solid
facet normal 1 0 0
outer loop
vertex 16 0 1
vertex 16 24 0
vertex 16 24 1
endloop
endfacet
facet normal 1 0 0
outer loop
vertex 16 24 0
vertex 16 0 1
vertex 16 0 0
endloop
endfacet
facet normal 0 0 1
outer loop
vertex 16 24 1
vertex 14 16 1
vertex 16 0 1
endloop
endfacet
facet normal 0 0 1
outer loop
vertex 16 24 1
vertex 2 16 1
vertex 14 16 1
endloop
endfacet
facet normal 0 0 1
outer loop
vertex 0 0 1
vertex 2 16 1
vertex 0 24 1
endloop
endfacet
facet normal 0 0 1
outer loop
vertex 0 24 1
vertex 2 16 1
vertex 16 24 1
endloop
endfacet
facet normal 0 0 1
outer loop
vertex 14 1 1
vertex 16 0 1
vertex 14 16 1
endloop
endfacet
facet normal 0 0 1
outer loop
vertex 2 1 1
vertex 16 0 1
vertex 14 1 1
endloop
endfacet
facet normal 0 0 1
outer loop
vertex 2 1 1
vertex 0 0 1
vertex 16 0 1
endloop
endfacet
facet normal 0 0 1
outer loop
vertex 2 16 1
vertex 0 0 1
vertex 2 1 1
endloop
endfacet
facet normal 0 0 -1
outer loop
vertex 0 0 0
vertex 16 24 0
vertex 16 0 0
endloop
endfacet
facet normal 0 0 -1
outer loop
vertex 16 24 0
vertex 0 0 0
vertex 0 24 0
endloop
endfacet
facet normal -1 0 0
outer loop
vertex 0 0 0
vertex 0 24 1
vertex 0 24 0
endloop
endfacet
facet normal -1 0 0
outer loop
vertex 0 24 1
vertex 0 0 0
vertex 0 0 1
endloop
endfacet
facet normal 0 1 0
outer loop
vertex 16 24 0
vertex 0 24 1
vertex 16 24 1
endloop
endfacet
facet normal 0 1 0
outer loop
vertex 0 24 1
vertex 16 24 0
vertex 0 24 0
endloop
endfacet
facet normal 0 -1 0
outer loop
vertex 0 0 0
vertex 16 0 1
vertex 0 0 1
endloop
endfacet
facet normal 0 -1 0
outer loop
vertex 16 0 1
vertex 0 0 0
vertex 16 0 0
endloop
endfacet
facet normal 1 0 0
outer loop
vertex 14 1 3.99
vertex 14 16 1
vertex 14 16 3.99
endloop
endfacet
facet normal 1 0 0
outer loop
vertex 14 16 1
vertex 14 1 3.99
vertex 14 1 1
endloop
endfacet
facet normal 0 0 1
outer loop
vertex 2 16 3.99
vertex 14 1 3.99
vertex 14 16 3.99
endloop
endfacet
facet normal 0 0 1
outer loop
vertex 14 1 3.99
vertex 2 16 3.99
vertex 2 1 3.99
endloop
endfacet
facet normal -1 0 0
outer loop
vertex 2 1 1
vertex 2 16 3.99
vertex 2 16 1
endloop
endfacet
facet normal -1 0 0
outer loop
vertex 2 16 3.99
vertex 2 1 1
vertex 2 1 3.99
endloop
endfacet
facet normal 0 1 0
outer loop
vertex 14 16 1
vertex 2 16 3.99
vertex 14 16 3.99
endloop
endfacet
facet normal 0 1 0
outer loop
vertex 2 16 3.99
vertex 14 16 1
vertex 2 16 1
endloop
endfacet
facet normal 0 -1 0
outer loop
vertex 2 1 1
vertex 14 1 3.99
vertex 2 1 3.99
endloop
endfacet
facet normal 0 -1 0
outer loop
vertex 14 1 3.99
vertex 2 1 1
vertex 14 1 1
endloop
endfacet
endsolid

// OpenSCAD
// file: config.scad
// Rendering: Level of detail
$fn = 80;

// Quickfix for rendering artifacts on overlapping surfaces
nothing = 0.01;

/*
 * Globally relevant model parameters
 */
adapter_pcb_size_x = 26;
adapter_pcb_size_y = 29;
adapter_pcb_size_z = 1.0;
adapter_pin_spacing = 2.54;

sensor_pcb_size_x = 20;
sensor_pcb_size_y = 20;
sensor_pcb_size_z = 1.0;

led_socket_pin_spacing = 2.54;
led_socket_pin_count = 4;
led_socket_size_x = led_socket_pin_count * led_socket_pin_spacing;
led_diameter = 5.0;
// main file
include <config.scad>;


/**
 * PCB with Espressif ESP8266 Wifi MCU and onboard antenna
 */
module esp8266mod(
            // PCB outline
            pcb_color = "black",
            pcb_size_x = 16.0,
            pcb_size_y = 24.0,
            pcb_size_z = 1.0,

            // MCU shield outline
            shield_color = "lightgray",
            shield_size_x = 12,
            shield_size_y = 15,
            shield_size_z = 3,
            shield_inset_x = 2,
            shield_inset_y = 1
        )
{
    // Board
    color(pcb_color)
    cube([pcb_size_x, pcb_size_y, pcb_size_z]);

    // MCU shield
    color(shield_color)
    translate([shield_inset_x, shield_inset_y, pcb_size_z-nothing])
    cube([shield_size_x, shield_size_y, shield_size_z]);
}

esp8266mod();
